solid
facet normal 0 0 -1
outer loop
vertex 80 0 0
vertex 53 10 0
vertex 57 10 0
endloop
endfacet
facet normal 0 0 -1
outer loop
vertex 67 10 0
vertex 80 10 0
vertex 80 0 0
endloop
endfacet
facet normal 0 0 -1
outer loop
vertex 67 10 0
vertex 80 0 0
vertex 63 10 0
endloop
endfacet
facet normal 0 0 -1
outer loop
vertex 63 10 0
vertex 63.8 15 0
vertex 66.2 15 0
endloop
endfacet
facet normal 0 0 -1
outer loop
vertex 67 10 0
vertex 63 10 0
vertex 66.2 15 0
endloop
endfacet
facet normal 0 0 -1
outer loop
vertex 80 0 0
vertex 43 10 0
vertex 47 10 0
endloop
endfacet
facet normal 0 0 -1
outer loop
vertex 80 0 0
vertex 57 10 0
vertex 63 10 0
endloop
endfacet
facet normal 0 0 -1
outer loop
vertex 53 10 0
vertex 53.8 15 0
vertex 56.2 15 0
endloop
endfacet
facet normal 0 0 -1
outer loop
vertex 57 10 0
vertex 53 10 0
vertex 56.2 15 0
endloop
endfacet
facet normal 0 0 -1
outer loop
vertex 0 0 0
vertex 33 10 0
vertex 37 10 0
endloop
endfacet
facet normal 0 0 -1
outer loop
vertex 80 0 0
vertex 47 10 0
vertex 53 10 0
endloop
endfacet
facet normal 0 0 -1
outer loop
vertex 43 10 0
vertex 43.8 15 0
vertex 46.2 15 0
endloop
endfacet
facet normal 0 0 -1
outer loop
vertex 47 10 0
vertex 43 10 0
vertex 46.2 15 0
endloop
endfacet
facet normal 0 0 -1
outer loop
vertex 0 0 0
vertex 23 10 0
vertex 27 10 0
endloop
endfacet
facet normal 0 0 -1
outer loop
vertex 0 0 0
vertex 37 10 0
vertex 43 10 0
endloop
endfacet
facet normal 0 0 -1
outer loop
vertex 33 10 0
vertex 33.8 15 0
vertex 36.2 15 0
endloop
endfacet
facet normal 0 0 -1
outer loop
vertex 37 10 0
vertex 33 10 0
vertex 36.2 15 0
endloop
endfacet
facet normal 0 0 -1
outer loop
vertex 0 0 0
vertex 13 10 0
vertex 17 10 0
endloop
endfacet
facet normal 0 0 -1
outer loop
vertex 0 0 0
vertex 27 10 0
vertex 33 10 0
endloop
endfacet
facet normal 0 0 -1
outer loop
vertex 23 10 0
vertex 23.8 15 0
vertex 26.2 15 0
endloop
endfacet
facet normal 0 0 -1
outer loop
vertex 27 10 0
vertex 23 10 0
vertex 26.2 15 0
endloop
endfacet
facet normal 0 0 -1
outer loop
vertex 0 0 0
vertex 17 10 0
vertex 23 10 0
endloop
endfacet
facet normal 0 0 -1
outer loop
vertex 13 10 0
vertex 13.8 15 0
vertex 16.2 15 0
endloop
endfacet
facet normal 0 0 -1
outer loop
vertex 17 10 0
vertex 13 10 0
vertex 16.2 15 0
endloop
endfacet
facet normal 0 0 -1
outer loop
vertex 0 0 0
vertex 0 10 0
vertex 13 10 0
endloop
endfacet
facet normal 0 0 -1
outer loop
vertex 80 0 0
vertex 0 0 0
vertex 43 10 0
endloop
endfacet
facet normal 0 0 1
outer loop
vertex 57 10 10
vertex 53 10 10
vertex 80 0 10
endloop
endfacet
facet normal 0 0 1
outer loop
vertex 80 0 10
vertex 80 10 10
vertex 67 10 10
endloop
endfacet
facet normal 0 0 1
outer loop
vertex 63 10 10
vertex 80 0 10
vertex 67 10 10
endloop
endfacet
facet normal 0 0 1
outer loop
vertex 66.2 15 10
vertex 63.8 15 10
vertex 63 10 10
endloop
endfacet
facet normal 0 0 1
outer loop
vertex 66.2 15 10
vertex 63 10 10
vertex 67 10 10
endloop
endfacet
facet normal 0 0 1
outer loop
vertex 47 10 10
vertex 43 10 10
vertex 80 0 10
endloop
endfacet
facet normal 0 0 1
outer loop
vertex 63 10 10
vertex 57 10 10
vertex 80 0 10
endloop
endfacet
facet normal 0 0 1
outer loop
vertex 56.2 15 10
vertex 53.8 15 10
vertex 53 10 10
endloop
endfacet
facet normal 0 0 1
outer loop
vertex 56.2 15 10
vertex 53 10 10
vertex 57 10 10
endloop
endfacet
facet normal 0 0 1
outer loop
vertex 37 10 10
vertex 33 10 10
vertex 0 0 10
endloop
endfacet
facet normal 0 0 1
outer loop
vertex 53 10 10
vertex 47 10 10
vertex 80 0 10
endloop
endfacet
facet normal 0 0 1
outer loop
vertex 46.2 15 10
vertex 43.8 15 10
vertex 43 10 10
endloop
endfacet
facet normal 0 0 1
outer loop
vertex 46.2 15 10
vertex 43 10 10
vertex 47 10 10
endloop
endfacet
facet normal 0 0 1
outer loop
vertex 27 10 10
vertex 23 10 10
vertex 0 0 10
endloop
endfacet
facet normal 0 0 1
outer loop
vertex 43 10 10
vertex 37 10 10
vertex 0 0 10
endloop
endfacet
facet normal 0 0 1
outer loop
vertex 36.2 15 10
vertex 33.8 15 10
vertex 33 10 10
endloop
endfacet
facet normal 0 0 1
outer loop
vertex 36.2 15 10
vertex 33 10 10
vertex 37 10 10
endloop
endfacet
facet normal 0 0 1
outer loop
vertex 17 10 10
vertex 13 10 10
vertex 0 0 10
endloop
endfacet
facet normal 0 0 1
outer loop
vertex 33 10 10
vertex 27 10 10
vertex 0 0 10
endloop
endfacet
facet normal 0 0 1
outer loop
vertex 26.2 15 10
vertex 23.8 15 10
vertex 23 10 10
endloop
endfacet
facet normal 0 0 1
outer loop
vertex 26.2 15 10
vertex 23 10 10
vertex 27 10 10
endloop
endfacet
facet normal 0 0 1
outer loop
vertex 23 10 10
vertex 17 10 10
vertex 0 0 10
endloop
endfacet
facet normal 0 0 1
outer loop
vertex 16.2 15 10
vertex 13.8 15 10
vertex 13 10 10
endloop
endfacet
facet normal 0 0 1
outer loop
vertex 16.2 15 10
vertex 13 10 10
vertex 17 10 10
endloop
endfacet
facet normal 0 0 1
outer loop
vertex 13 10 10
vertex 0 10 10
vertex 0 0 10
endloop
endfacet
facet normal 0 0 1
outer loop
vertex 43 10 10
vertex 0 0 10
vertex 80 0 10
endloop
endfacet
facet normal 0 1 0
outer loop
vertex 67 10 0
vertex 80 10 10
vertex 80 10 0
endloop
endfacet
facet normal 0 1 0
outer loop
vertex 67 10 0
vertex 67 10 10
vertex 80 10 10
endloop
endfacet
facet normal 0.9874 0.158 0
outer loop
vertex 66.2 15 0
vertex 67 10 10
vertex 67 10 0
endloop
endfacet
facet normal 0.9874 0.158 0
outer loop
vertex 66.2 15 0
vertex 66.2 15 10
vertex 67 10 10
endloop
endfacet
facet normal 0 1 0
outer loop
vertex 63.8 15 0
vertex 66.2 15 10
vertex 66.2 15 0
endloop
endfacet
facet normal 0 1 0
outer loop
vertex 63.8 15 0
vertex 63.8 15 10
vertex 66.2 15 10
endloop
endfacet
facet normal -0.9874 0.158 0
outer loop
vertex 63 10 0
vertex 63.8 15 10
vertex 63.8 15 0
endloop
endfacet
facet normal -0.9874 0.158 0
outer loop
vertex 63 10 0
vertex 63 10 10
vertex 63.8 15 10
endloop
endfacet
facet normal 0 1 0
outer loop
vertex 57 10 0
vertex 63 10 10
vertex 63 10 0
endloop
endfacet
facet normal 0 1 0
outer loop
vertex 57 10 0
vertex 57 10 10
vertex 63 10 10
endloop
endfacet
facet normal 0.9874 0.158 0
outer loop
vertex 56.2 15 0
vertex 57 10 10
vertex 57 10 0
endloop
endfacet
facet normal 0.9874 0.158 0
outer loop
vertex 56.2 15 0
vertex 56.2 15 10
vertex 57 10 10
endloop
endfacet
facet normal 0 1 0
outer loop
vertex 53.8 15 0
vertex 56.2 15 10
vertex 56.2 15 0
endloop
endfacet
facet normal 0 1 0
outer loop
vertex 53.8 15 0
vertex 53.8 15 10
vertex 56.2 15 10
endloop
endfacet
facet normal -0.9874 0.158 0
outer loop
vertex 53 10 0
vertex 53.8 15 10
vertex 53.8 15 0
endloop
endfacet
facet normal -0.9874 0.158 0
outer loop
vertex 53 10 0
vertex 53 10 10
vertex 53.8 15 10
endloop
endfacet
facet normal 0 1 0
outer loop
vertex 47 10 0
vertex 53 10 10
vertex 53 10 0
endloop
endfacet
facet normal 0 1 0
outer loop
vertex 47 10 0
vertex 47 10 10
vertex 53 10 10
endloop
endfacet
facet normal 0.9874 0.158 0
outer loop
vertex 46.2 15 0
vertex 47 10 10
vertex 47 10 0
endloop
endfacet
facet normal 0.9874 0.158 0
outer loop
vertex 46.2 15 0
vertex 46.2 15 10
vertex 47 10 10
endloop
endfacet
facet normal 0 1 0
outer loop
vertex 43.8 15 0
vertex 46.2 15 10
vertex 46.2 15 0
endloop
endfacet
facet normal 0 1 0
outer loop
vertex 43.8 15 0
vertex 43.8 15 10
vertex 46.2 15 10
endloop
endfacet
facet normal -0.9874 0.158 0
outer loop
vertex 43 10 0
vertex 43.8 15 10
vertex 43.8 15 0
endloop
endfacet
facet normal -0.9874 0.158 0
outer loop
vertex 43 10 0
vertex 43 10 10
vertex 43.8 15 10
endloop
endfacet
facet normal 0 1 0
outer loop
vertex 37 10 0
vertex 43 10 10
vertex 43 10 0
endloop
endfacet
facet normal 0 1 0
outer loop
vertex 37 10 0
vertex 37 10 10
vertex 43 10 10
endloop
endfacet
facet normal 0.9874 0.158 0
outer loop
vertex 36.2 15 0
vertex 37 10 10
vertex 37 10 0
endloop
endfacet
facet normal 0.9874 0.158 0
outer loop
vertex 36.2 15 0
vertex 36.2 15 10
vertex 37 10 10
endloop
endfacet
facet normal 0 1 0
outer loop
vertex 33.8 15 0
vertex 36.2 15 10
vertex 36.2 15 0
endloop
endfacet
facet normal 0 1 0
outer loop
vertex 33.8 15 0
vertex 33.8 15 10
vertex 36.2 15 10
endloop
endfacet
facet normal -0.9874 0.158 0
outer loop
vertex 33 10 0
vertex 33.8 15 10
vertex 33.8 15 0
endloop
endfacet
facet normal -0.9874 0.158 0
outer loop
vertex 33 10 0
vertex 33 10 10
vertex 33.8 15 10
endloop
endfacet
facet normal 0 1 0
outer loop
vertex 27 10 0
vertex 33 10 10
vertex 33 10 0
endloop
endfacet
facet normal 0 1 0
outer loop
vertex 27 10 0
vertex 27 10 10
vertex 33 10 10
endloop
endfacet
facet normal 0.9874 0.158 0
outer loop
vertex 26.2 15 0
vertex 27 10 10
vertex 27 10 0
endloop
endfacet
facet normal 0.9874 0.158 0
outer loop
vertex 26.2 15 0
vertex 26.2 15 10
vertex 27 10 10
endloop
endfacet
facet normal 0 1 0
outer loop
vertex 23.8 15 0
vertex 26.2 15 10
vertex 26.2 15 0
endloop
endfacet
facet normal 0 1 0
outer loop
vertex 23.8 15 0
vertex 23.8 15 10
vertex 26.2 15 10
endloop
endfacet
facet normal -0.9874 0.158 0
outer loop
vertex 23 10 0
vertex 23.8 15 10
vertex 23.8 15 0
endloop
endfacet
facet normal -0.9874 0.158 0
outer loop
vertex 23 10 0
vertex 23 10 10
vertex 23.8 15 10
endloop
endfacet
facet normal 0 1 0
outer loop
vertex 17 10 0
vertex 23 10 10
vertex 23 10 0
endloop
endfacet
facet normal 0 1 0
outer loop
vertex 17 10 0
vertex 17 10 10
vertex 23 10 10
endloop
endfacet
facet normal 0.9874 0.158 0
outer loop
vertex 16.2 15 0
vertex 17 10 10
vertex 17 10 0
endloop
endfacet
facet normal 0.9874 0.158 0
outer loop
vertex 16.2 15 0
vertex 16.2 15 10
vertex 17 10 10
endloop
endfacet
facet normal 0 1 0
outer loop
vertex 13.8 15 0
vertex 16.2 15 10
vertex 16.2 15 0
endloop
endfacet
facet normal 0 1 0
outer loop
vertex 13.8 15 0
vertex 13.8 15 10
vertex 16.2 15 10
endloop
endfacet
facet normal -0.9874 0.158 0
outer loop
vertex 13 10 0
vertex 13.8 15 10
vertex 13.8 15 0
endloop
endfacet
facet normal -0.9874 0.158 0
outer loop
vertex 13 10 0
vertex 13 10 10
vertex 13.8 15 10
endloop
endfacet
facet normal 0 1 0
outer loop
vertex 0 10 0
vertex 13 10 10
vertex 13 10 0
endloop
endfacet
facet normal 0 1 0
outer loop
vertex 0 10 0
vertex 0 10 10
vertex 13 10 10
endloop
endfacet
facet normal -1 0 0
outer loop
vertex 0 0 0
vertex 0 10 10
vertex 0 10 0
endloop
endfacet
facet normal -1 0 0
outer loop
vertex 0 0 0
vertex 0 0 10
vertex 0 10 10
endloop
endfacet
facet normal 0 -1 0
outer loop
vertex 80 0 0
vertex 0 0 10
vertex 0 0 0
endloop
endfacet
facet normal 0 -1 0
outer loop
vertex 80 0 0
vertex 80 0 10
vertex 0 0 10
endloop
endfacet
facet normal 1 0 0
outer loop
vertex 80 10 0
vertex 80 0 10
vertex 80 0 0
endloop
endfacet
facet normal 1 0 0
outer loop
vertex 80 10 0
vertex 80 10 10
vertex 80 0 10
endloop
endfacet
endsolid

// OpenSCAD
$fn = 32;

// ----------------------------------------------------------------------
// Gear rack: 6 teeth on a 80 mm bar, pitch 10 mm
// ----------------------------------------------------------------------

// --- parameters (mm) ---
profile_height = 10;      // extrusion height
profile_points = 28;      // points of the closed outline

profile = [[0, 0], [80, 0], [80, 10], [67, 10], [66.2, 15], [63.8, 15], [63, 10], [57, 10], [56.2, 15], [53.8, 15], [53, 10], [47, 10], [46.2, 15], [43.8, 15], [43, 10], [37, 10], [36.2, 15], [33.8, 15], [33, 10], [27, 10], [26.2, 15], [23.8, 15], [23, 10], [17, 10], [16.2, 15], [13.8, 15], [13, 10], [0, 10]];  // single closed polygon, 28 points, counter clockwise

// --- the one profile operation ---
linear_extrude(height = profile_height) polygon(points = profile);
